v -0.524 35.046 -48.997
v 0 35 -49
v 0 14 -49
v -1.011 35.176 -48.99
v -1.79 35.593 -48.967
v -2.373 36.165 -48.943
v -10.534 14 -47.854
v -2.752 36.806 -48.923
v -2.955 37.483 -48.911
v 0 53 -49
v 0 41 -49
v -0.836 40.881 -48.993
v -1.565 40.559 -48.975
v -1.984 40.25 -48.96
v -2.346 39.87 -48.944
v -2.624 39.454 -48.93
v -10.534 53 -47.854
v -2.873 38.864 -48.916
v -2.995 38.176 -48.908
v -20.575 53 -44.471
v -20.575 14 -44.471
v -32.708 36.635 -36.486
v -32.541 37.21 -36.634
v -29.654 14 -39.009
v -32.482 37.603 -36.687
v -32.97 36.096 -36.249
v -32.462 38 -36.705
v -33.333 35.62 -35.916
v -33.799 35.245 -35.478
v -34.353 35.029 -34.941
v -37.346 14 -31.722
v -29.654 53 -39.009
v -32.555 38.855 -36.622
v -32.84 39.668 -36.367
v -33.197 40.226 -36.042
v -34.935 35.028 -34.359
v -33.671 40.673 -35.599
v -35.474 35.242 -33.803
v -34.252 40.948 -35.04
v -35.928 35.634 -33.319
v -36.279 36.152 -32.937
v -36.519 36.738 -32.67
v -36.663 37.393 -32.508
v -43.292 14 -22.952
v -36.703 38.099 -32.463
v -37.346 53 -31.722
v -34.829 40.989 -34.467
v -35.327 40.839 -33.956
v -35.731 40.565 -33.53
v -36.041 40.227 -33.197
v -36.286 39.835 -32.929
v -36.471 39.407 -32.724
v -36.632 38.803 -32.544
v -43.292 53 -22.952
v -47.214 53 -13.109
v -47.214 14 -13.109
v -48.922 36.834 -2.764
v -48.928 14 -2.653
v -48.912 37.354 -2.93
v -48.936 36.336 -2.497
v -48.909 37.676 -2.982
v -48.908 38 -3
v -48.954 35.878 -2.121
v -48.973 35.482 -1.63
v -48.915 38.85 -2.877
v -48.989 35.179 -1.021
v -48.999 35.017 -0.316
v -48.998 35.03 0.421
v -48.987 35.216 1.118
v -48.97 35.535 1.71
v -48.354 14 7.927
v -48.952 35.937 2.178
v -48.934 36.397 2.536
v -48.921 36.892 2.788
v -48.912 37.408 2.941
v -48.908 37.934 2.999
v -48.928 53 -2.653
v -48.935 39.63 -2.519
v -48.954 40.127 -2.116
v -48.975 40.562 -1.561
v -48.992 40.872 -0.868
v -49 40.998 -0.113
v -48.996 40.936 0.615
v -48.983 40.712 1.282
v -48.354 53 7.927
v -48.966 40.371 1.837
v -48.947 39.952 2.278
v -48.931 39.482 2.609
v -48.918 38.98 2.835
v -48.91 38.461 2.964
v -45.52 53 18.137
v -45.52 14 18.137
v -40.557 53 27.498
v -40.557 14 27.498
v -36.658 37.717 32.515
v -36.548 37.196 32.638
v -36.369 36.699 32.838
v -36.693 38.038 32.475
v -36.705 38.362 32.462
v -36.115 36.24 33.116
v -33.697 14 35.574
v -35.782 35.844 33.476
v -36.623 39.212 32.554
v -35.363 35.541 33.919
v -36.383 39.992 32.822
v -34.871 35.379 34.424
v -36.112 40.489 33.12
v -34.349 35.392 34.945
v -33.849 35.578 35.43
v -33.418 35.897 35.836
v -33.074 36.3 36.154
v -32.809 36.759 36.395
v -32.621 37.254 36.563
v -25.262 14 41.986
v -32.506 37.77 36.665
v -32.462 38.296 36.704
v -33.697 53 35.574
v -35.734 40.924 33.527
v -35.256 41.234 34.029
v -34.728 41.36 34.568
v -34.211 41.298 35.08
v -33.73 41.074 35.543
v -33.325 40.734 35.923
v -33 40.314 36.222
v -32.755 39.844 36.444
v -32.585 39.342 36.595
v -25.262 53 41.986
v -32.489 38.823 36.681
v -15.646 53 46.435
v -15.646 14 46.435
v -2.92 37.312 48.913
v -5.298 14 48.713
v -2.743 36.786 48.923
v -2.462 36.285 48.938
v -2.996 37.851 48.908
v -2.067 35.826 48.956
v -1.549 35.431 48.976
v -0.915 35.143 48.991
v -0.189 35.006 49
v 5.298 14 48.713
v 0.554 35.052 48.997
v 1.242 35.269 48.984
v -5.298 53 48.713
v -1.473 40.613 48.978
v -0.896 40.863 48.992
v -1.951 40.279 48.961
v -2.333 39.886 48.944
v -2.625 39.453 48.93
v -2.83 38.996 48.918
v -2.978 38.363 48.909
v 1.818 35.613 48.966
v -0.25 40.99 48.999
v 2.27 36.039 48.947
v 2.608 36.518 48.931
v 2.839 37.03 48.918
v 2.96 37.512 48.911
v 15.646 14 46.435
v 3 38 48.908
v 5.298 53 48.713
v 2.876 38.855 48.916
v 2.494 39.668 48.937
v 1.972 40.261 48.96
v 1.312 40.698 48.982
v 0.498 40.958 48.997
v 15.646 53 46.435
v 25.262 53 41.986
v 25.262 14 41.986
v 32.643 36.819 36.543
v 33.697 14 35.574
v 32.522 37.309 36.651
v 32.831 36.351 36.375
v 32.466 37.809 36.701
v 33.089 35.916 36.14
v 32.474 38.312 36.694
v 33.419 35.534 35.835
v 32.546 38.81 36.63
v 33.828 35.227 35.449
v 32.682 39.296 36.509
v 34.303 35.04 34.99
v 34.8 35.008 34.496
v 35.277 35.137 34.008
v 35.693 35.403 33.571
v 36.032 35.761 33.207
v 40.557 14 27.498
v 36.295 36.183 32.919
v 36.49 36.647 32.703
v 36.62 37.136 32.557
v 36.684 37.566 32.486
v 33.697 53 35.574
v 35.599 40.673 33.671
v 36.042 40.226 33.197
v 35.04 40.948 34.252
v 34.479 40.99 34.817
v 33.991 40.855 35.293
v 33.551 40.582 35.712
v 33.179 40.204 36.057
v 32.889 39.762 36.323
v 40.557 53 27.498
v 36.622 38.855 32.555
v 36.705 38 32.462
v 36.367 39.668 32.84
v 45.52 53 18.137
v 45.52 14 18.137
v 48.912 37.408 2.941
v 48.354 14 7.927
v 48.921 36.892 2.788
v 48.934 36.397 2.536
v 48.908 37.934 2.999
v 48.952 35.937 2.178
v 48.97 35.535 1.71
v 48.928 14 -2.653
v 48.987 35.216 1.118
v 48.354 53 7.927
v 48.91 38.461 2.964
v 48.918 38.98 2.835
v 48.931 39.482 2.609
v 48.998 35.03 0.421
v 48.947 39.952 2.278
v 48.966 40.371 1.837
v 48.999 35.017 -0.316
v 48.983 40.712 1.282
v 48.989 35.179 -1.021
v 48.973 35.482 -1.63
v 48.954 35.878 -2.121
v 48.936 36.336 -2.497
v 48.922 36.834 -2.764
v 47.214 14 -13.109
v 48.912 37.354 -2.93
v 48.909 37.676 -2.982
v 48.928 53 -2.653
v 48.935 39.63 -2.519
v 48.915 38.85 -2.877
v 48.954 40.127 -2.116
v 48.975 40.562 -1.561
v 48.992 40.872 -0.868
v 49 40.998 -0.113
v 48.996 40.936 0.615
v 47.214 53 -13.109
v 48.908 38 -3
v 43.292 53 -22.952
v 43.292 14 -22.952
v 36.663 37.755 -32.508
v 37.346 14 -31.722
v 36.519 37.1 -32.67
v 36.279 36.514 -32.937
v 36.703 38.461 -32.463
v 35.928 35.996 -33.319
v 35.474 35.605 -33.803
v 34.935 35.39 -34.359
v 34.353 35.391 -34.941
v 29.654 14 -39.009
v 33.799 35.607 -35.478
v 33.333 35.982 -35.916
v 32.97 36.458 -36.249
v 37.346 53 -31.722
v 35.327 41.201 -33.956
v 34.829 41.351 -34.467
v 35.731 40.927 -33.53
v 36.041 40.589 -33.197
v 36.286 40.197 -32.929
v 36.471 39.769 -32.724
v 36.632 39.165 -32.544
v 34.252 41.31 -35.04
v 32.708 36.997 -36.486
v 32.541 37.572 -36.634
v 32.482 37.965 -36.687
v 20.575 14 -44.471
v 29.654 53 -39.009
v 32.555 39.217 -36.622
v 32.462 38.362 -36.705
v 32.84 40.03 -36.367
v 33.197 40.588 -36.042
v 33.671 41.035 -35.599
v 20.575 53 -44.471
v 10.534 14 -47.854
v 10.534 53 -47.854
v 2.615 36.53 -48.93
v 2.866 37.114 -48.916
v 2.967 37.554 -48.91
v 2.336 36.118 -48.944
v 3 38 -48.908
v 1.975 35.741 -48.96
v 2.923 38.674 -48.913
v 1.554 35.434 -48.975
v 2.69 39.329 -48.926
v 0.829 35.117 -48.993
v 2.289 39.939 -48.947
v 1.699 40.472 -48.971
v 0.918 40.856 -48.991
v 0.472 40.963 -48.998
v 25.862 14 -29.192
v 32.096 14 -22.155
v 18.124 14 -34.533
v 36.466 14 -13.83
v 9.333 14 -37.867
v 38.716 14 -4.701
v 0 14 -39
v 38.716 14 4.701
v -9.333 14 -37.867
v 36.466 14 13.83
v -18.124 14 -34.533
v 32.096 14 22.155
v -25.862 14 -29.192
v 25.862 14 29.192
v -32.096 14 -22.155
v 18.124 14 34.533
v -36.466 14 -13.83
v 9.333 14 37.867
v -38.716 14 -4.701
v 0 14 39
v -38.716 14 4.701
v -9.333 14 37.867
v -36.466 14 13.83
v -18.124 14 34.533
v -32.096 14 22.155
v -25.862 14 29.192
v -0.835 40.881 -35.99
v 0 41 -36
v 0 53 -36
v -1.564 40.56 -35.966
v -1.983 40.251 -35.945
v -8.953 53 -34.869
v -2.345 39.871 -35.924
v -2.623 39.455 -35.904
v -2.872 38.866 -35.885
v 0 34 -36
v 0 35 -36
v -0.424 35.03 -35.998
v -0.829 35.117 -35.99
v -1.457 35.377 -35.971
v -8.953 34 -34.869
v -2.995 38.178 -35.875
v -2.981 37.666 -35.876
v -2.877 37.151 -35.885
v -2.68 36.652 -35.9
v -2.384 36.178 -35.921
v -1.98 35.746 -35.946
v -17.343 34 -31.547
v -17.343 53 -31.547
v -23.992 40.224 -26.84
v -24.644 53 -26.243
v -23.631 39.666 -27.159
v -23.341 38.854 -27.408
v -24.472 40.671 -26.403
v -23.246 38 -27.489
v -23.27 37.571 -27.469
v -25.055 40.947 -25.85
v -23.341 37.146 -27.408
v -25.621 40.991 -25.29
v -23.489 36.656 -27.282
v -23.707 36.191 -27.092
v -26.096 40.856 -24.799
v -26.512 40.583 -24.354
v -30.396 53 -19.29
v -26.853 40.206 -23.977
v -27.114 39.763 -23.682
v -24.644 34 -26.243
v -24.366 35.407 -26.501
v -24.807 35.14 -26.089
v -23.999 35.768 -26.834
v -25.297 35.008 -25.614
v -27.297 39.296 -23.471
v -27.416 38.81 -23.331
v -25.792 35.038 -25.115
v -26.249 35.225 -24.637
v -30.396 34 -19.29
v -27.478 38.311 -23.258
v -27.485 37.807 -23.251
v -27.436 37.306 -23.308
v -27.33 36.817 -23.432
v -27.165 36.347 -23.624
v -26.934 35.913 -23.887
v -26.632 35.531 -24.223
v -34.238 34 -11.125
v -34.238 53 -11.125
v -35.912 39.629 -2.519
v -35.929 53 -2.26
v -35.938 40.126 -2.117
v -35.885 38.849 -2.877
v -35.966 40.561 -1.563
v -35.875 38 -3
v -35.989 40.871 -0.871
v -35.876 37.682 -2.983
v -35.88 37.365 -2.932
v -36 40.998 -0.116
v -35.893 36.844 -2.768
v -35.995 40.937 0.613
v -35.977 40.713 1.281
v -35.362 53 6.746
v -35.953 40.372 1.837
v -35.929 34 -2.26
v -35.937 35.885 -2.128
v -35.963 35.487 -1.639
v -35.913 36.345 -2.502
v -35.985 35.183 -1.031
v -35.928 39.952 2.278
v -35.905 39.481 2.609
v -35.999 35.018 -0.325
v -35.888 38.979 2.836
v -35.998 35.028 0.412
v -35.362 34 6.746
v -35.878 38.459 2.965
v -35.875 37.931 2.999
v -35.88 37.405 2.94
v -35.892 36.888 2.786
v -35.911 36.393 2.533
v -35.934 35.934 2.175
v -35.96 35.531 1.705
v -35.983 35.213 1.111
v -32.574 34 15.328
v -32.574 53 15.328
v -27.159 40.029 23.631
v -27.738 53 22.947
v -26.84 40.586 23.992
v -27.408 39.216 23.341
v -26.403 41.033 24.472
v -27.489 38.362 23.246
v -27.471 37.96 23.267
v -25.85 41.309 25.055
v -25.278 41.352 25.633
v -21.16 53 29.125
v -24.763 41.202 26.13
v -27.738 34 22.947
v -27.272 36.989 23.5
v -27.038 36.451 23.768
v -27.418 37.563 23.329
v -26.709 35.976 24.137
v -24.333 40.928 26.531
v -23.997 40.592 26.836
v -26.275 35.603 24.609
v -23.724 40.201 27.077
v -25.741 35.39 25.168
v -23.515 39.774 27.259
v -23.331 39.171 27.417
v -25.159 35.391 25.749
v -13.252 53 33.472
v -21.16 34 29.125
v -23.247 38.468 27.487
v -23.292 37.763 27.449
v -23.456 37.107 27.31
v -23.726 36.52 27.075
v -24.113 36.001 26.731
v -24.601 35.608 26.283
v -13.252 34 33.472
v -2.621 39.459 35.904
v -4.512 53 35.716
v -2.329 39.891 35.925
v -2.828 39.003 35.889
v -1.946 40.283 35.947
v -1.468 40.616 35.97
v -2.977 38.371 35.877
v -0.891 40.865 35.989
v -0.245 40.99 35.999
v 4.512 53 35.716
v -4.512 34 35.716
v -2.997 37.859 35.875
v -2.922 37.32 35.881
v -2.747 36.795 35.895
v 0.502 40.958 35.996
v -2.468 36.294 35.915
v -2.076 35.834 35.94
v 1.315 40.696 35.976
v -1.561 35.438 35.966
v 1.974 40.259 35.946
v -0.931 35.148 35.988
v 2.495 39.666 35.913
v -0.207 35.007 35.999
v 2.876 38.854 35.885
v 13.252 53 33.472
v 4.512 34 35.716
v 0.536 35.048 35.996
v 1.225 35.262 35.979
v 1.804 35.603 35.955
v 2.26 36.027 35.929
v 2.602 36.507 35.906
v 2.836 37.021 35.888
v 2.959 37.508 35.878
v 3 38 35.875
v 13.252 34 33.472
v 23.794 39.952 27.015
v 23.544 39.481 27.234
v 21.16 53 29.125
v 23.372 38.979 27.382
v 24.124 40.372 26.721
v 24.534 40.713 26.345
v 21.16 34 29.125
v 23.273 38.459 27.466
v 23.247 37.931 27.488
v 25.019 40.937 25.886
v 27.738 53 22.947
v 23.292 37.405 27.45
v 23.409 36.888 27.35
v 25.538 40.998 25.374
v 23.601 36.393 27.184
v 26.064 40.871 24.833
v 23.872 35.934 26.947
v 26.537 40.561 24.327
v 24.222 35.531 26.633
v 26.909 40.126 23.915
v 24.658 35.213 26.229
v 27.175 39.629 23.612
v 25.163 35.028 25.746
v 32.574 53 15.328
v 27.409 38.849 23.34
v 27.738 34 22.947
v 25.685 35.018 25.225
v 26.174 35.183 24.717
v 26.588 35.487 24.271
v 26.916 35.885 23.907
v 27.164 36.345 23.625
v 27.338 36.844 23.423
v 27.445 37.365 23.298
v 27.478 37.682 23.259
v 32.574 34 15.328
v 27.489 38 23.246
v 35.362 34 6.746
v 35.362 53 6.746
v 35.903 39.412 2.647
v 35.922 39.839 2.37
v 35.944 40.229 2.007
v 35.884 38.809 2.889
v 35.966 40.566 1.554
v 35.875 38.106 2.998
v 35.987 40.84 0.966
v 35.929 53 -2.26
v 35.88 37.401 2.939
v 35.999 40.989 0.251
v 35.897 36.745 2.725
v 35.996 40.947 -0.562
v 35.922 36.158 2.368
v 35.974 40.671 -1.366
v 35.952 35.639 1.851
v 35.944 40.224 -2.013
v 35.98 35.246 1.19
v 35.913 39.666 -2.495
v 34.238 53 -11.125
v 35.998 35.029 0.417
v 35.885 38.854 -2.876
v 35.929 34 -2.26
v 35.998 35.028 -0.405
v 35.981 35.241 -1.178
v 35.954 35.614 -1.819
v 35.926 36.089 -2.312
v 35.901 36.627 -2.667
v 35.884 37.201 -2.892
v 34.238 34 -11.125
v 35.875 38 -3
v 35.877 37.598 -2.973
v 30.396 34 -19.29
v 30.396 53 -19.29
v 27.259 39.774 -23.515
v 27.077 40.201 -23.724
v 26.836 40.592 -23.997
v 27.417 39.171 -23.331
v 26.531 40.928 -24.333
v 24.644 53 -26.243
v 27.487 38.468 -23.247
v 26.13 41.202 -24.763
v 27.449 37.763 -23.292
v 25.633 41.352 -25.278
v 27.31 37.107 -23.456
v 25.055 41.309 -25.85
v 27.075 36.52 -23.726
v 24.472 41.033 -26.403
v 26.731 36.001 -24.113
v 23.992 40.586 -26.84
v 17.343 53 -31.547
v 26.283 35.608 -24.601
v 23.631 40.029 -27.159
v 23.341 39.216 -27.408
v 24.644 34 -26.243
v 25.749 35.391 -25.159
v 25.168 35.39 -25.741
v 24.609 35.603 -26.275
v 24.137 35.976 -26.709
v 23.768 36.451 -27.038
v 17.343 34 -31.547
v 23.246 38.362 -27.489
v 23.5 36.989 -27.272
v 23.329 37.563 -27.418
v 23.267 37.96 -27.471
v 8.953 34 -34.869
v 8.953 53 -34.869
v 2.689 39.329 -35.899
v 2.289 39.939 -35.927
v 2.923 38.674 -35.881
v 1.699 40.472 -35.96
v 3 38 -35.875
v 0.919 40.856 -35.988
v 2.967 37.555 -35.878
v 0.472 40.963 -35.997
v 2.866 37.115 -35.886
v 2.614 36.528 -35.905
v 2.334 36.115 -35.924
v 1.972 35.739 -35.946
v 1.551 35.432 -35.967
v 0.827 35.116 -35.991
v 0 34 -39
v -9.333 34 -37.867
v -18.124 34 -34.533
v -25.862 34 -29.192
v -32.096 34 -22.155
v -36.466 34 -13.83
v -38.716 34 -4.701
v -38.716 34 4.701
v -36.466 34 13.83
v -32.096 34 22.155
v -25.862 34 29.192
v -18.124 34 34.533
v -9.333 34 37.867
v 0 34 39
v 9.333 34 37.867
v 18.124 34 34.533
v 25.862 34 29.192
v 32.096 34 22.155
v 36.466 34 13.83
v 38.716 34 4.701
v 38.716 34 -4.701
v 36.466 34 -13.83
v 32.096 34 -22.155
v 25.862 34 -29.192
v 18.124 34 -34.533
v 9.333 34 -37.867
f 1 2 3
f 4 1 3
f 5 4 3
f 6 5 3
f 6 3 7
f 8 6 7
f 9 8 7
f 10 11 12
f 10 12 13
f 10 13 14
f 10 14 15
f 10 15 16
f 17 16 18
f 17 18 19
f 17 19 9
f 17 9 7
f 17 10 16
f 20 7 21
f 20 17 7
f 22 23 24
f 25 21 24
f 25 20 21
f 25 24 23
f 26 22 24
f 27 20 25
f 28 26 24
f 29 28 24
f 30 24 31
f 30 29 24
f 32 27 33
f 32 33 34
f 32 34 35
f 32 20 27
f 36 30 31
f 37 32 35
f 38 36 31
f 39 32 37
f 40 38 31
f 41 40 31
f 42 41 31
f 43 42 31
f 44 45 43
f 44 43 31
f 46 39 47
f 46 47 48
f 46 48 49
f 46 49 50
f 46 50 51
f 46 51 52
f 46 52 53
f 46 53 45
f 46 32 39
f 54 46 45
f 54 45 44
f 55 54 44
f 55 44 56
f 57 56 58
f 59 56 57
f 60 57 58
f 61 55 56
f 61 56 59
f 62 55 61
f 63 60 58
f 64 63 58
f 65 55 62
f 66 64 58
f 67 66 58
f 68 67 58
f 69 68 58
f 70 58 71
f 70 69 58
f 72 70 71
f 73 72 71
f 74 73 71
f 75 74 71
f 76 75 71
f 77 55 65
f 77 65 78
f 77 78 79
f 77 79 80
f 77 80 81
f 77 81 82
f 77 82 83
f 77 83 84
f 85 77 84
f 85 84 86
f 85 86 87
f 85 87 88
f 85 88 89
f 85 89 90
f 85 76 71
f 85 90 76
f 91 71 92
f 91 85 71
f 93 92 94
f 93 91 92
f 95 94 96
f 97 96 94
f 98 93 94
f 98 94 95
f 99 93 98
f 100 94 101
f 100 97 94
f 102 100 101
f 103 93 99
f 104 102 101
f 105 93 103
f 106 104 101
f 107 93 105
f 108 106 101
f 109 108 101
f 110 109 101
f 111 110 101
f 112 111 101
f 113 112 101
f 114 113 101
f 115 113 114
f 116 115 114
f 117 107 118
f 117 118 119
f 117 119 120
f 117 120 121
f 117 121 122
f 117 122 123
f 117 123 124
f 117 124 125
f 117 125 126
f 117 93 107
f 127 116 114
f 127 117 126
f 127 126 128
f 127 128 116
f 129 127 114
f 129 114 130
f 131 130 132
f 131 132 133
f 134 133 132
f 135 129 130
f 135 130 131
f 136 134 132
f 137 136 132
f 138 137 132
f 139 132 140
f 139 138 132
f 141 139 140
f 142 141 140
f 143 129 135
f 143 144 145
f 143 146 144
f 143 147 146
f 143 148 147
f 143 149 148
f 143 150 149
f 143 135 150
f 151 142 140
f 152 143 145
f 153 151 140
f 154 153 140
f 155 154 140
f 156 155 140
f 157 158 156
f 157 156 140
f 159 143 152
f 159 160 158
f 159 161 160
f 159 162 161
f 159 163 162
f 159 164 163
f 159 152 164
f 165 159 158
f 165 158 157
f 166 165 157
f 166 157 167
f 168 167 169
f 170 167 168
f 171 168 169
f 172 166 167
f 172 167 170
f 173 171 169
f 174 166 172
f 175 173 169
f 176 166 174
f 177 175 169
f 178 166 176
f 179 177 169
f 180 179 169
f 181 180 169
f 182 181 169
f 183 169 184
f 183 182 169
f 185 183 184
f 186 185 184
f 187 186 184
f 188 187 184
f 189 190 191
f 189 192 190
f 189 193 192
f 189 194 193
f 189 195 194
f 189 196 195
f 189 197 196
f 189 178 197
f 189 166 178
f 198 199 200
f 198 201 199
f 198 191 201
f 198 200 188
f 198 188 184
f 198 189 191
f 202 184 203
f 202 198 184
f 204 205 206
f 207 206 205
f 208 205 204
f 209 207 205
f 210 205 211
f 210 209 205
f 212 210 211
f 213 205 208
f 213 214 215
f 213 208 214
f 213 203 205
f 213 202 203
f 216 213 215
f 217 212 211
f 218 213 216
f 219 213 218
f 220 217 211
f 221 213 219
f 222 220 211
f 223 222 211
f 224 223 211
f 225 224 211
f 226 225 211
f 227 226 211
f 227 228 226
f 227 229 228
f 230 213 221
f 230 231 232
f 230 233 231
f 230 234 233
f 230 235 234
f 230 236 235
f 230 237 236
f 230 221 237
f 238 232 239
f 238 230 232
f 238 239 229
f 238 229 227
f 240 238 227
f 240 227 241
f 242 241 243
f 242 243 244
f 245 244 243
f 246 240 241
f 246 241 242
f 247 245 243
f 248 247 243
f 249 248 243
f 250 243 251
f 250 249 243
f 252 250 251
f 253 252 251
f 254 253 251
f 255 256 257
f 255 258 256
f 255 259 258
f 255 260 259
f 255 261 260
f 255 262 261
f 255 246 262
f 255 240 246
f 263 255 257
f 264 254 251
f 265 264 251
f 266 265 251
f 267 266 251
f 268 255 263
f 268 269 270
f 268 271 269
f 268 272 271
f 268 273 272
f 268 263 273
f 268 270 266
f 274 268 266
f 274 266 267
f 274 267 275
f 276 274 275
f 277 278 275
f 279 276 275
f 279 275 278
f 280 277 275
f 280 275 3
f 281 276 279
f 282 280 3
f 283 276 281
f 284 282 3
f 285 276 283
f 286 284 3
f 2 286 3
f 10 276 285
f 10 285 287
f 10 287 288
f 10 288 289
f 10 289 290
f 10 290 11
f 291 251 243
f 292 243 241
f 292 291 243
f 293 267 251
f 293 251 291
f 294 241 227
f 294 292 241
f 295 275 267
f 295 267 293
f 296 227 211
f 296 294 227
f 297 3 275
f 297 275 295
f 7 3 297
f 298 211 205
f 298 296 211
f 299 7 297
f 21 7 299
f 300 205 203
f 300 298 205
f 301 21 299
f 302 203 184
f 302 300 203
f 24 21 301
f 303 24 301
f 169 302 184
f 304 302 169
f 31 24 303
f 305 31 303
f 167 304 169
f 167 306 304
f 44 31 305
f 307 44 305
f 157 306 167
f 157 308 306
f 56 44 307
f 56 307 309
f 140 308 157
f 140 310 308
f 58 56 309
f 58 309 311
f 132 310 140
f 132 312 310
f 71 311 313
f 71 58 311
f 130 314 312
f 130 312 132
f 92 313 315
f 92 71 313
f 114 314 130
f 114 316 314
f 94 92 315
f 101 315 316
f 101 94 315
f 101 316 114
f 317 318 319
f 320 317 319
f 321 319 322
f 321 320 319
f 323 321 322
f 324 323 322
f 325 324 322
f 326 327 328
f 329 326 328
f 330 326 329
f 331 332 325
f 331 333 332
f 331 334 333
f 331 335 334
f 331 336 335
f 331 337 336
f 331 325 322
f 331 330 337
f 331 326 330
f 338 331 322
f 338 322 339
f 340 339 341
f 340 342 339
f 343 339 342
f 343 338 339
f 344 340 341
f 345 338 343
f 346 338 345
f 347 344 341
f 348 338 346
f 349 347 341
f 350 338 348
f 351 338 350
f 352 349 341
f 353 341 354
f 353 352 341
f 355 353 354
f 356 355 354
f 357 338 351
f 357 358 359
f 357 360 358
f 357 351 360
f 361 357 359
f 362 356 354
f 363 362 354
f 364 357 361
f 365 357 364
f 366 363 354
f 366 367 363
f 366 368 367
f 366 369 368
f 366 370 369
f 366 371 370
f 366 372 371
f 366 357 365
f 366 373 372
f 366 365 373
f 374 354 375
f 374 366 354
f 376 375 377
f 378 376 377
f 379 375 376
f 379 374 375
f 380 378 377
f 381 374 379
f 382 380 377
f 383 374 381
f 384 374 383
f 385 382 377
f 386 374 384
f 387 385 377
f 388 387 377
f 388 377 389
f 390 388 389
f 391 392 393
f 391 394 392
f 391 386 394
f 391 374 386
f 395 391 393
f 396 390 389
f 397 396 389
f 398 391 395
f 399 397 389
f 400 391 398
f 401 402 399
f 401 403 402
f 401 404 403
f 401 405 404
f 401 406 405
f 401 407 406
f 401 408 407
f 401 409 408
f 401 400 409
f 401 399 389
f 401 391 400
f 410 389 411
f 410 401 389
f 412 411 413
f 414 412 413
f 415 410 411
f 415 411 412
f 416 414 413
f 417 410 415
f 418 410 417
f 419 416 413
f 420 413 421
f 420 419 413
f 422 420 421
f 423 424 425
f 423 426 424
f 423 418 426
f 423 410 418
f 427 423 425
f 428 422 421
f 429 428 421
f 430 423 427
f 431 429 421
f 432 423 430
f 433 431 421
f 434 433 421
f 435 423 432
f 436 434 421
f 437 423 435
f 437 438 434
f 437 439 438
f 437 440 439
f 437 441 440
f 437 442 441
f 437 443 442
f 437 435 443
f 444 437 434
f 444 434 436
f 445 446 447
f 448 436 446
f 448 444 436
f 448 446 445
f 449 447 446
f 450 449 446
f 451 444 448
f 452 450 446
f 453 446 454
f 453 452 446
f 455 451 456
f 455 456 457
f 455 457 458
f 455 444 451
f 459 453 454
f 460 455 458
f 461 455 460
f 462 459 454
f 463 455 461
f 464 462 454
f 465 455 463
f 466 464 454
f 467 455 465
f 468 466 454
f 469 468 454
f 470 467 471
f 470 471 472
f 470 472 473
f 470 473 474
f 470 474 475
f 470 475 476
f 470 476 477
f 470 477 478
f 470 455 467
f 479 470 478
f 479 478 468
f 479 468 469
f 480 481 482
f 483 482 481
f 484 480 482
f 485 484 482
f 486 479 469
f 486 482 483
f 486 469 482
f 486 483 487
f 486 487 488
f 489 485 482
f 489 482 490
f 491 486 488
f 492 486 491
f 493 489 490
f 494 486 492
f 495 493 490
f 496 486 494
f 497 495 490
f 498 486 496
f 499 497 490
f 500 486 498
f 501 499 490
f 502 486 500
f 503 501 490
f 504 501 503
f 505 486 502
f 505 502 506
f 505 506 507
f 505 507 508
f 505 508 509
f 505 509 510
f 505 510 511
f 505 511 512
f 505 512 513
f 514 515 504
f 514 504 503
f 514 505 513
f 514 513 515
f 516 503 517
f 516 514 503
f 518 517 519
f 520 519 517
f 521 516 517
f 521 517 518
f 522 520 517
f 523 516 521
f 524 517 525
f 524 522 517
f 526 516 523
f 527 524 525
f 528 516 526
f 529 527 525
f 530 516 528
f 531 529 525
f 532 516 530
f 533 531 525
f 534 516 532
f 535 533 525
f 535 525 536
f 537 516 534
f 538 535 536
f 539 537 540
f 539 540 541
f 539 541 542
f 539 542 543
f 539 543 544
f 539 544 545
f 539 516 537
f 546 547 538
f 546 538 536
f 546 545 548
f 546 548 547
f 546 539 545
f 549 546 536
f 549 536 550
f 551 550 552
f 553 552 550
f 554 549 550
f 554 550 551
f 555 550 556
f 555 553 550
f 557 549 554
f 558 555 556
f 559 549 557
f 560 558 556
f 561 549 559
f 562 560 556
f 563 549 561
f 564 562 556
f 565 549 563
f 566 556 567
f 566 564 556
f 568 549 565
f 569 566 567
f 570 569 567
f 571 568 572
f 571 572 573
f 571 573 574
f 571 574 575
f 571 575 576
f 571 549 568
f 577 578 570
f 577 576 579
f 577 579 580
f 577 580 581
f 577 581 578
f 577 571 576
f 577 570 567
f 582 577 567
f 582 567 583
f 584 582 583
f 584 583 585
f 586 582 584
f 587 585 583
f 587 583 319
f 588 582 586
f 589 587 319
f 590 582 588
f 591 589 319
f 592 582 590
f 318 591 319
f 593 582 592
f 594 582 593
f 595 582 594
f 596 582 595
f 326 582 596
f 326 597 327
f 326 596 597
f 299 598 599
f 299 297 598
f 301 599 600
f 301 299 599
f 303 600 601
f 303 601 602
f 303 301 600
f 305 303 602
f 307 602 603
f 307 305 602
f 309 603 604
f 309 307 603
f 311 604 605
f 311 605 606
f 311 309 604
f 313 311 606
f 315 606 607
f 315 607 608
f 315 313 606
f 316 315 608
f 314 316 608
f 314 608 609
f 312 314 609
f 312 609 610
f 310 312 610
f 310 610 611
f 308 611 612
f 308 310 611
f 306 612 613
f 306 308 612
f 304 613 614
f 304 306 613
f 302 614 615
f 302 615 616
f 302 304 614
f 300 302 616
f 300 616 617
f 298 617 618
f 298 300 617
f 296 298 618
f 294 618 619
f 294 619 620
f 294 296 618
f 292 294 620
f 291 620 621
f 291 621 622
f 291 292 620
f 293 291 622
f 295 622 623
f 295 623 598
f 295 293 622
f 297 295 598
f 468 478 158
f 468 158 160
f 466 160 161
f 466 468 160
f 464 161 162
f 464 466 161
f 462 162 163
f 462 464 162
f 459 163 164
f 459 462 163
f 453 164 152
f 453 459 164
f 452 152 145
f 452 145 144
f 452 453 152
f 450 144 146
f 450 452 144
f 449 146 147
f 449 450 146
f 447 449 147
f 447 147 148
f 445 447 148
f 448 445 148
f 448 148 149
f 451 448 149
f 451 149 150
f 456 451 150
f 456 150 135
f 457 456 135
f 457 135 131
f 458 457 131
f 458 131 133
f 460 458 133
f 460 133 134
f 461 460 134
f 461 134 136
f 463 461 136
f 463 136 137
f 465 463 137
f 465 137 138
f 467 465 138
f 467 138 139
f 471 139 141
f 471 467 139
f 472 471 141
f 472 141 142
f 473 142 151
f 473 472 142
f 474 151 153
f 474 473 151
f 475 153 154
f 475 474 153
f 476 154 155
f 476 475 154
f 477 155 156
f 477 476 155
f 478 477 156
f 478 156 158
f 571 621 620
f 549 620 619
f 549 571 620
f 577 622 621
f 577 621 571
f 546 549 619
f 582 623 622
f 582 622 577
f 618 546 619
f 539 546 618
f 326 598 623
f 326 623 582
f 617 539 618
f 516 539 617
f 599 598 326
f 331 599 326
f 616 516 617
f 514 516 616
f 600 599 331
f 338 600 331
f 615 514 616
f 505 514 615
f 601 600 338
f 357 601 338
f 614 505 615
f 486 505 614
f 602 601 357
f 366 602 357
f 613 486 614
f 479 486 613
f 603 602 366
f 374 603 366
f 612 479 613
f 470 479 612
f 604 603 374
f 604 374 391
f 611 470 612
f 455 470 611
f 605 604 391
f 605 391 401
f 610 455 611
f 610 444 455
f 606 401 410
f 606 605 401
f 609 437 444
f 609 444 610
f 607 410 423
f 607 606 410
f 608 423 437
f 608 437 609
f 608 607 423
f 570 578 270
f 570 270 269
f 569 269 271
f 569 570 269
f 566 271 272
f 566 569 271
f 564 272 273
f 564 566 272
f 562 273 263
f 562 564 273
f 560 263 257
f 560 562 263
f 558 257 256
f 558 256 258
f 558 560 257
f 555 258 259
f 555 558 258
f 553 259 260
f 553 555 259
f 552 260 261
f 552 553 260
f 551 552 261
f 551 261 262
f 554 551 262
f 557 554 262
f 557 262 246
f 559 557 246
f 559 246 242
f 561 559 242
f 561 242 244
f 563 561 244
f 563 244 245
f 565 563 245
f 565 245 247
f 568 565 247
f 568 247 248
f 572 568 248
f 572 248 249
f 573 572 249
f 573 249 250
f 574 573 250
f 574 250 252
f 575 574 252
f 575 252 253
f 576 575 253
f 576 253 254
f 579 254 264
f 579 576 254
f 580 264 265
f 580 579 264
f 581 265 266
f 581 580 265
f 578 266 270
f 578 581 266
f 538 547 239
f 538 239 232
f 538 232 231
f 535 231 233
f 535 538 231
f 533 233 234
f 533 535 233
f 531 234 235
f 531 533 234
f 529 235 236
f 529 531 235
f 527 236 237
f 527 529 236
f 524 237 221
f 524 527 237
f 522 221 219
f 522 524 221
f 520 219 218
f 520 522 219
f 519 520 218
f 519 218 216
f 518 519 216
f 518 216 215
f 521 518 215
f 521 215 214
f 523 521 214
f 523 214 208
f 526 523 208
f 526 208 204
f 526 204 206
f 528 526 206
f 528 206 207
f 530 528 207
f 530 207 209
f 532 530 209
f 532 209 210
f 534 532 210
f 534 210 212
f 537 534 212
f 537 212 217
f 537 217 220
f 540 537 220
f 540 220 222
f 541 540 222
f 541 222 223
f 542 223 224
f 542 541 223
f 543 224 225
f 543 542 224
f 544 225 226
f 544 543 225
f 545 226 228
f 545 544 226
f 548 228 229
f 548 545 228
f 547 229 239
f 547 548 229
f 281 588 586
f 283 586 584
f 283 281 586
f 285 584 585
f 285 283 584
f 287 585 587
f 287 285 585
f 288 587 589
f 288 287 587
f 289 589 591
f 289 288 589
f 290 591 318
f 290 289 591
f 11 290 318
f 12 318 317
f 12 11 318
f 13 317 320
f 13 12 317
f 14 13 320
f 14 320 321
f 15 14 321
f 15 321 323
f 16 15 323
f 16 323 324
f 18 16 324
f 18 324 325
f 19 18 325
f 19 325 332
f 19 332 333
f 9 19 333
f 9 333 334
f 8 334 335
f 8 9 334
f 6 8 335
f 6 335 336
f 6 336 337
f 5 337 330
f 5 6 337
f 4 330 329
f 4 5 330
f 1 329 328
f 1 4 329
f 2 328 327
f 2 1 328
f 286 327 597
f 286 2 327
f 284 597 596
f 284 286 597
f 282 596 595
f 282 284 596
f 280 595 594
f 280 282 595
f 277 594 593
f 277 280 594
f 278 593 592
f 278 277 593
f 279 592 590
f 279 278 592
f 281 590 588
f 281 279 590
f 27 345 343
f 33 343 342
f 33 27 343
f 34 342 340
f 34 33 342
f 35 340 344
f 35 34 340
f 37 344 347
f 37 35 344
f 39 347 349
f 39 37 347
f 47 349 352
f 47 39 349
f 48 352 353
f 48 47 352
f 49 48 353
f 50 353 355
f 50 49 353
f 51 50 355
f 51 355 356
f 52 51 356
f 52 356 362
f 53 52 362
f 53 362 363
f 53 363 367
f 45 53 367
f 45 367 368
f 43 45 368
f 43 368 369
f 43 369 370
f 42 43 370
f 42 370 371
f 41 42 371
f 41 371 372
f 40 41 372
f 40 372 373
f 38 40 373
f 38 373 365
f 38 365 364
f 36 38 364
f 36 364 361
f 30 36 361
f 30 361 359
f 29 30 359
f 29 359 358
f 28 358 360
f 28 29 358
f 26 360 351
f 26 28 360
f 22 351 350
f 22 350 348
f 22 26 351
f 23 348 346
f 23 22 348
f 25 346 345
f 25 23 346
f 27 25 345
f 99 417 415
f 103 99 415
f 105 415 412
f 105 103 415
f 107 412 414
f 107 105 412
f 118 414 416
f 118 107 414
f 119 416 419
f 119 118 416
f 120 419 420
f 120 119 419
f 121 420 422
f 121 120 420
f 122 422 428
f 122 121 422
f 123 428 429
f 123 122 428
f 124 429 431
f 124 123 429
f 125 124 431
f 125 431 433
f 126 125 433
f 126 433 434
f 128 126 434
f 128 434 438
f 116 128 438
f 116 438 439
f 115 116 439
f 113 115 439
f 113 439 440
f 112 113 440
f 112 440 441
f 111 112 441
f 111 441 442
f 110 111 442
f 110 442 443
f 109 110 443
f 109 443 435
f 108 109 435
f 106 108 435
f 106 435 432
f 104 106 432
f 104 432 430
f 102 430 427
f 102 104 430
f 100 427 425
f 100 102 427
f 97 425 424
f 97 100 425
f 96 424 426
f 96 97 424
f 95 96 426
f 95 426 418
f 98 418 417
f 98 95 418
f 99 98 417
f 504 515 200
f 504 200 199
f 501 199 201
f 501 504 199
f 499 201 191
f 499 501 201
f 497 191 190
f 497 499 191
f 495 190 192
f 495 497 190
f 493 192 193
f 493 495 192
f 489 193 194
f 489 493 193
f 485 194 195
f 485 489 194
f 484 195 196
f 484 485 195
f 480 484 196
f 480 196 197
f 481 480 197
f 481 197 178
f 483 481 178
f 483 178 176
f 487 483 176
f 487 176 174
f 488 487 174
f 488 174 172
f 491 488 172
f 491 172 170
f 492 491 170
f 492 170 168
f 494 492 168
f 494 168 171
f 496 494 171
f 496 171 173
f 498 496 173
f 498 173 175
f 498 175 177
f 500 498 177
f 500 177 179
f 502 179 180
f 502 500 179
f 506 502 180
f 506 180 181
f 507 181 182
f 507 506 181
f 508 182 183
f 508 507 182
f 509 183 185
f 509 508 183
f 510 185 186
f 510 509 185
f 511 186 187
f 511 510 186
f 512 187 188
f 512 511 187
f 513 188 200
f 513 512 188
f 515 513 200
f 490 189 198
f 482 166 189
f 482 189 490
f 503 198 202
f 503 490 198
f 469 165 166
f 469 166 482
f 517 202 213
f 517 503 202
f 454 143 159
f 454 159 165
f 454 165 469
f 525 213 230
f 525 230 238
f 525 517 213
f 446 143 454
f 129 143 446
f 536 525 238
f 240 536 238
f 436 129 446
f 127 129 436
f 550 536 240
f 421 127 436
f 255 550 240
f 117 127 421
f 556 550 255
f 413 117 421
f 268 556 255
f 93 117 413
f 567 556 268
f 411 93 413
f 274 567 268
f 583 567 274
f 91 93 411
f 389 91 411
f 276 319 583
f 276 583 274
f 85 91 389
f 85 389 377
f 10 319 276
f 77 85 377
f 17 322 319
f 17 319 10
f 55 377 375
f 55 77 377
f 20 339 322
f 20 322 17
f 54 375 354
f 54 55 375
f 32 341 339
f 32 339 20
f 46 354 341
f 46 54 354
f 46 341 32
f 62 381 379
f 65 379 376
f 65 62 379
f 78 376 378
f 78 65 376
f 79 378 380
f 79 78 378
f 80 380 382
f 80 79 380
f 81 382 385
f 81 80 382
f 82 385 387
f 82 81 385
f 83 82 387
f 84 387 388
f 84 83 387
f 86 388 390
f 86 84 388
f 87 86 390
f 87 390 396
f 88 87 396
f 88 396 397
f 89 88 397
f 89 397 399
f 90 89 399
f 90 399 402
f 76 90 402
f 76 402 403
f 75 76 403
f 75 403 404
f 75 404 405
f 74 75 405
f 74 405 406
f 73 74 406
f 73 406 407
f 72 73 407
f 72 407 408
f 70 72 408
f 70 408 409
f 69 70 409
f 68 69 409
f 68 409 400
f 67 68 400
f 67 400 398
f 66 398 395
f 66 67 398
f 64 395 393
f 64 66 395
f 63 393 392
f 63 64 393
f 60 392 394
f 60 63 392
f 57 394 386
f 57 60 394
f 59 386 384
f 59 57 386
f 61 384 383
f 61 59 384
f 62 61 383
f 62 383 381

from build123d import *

# Parameters (mm, degrees)
CORTAR_EXTRUIR1_DEPTH      = 88.241045386
CORTAR_EXTRUIR1_DEPTH_BACK = 88.241045386
CROQUIS2_R                 = 3
CORTAR_EXTRUIR2_DEPTH      = 88.241045559
CORTAR_EXTRUIR2_DEPTH_BACK = 88.241045559
CROQUIS3_R                 = 3
CORTAR_EXTRUIR3_DEPTH      = 88.241045559
CORTAR_EXTRUIR3_DEPTH_BACK = 88.241045559
CROQUIS4_R                 = 3
CORTAR_EXTRUIR4_DEPTH      = 88.241045559
CORTAR_EXTRUIR4_DEPTH_BACK = 88.241045559
CROQUIS5_R                 = 3


with BuildPart() as part:
    # Croquis1 → Revolución1 (revolve)
    with BuildSketch(Plane(origin=(0, 0, 0), x_dir=(0, 0, -1), z_dir=(1, 0, 0)), mode=Mode.PRIVATE) as revoluci_n1_sk:
        Polygon((-49, 53), (-36, 53), (-36, 34), (-39, 34), (-39, 14), (-49, 14), align=None)
    revolve(revoluci_n1_sk.sketch.rotate(Axis((0, 0, 0), (0, 1, 0)), 180), axis=Axis((0, 0, 0), (0, 1, 0)))

    # Croquis2 → Cortar-Extruir1 (cut, two sides: drawn at the far end of the back side and taken through both)
    with BuildSketch(Plane(origin=(0, 0, 0), x_dir=(0, 0, -1), z_dir=(1, 0, 0)).offset(-CORTAR_EXTRUIR1_DEPTH_BACK)):
        with Locations((0, 38)):
            Circle(CROQUIS2_R)
    extrude(amount=CORTAR_EXTRUIR1_DEPTH + CORTAR_EXTRUIR1_DEPTH_BACK, mode=Mode.SUBTRACT)

    # Croquis3 → Cortar-Extruir2 (cut, two sides: drawn at the far end of the back side and taken through both)
    with BuildSketch(Plane.XY.offset(-CORTAR_EXTRUIR2_DEPTH_BACK)):
        with Locations((0, 38)):
            Circle(CROQUIS3_R)
    extrude(amount=CORTAR_EXTRUIR2_DEPTH + CORTAR_EXTRUIR2_DEPTH_BACK, mode=Mode.SUBTRACT)

    # Croquis4 → Cortar-Extruir3 (cut, two sides: drawn at the far end of the back side and taken through both)
    with BuildSketch(Plane(origin=(0, 0, 0), x_dir=(-0.7071067811865477, 0, -0.7071067811865475), z_dir=(0.7071067811865475, 0, -0.7071067811865477)).offset(-CORTAR_EXTRUIR3_DEPTH_BACK)):
        with Locations((0, 38.362139971)):
            Circle(CROQUIS4_R)
    extrude(amount=CORTAR_EXTRUIR3_DEPTH + CORTAR_EXTRUIR3_DEPTH_BACK, mode=Mode.SUBTRACT)

    # Croquis5 → Cortar-Extruir4 (cut, two sides: drawn at the far end of the back side and taken through both)
    with BuildSketch(Plane(origin=(0, 0, 0), x_dir=(0.7071067811865502, 0, -0.7071067811865449), z_dir=(0.7071067811865449, 6.982962677686268e-15, 0.7071067811865502)).offset(-CORTAR_EXTRUIR4_DEPTH_BACK)):
        with Locations((0, 38)):
            Circle(CROQUIS5_R)
    extrude(amount=CORTAR_EXTRUIR4_DEPTH + CORTAR_EXTRUIR4_DEPTH_BACK, mode=Mode.SUBTRACT)


solid = part.part
